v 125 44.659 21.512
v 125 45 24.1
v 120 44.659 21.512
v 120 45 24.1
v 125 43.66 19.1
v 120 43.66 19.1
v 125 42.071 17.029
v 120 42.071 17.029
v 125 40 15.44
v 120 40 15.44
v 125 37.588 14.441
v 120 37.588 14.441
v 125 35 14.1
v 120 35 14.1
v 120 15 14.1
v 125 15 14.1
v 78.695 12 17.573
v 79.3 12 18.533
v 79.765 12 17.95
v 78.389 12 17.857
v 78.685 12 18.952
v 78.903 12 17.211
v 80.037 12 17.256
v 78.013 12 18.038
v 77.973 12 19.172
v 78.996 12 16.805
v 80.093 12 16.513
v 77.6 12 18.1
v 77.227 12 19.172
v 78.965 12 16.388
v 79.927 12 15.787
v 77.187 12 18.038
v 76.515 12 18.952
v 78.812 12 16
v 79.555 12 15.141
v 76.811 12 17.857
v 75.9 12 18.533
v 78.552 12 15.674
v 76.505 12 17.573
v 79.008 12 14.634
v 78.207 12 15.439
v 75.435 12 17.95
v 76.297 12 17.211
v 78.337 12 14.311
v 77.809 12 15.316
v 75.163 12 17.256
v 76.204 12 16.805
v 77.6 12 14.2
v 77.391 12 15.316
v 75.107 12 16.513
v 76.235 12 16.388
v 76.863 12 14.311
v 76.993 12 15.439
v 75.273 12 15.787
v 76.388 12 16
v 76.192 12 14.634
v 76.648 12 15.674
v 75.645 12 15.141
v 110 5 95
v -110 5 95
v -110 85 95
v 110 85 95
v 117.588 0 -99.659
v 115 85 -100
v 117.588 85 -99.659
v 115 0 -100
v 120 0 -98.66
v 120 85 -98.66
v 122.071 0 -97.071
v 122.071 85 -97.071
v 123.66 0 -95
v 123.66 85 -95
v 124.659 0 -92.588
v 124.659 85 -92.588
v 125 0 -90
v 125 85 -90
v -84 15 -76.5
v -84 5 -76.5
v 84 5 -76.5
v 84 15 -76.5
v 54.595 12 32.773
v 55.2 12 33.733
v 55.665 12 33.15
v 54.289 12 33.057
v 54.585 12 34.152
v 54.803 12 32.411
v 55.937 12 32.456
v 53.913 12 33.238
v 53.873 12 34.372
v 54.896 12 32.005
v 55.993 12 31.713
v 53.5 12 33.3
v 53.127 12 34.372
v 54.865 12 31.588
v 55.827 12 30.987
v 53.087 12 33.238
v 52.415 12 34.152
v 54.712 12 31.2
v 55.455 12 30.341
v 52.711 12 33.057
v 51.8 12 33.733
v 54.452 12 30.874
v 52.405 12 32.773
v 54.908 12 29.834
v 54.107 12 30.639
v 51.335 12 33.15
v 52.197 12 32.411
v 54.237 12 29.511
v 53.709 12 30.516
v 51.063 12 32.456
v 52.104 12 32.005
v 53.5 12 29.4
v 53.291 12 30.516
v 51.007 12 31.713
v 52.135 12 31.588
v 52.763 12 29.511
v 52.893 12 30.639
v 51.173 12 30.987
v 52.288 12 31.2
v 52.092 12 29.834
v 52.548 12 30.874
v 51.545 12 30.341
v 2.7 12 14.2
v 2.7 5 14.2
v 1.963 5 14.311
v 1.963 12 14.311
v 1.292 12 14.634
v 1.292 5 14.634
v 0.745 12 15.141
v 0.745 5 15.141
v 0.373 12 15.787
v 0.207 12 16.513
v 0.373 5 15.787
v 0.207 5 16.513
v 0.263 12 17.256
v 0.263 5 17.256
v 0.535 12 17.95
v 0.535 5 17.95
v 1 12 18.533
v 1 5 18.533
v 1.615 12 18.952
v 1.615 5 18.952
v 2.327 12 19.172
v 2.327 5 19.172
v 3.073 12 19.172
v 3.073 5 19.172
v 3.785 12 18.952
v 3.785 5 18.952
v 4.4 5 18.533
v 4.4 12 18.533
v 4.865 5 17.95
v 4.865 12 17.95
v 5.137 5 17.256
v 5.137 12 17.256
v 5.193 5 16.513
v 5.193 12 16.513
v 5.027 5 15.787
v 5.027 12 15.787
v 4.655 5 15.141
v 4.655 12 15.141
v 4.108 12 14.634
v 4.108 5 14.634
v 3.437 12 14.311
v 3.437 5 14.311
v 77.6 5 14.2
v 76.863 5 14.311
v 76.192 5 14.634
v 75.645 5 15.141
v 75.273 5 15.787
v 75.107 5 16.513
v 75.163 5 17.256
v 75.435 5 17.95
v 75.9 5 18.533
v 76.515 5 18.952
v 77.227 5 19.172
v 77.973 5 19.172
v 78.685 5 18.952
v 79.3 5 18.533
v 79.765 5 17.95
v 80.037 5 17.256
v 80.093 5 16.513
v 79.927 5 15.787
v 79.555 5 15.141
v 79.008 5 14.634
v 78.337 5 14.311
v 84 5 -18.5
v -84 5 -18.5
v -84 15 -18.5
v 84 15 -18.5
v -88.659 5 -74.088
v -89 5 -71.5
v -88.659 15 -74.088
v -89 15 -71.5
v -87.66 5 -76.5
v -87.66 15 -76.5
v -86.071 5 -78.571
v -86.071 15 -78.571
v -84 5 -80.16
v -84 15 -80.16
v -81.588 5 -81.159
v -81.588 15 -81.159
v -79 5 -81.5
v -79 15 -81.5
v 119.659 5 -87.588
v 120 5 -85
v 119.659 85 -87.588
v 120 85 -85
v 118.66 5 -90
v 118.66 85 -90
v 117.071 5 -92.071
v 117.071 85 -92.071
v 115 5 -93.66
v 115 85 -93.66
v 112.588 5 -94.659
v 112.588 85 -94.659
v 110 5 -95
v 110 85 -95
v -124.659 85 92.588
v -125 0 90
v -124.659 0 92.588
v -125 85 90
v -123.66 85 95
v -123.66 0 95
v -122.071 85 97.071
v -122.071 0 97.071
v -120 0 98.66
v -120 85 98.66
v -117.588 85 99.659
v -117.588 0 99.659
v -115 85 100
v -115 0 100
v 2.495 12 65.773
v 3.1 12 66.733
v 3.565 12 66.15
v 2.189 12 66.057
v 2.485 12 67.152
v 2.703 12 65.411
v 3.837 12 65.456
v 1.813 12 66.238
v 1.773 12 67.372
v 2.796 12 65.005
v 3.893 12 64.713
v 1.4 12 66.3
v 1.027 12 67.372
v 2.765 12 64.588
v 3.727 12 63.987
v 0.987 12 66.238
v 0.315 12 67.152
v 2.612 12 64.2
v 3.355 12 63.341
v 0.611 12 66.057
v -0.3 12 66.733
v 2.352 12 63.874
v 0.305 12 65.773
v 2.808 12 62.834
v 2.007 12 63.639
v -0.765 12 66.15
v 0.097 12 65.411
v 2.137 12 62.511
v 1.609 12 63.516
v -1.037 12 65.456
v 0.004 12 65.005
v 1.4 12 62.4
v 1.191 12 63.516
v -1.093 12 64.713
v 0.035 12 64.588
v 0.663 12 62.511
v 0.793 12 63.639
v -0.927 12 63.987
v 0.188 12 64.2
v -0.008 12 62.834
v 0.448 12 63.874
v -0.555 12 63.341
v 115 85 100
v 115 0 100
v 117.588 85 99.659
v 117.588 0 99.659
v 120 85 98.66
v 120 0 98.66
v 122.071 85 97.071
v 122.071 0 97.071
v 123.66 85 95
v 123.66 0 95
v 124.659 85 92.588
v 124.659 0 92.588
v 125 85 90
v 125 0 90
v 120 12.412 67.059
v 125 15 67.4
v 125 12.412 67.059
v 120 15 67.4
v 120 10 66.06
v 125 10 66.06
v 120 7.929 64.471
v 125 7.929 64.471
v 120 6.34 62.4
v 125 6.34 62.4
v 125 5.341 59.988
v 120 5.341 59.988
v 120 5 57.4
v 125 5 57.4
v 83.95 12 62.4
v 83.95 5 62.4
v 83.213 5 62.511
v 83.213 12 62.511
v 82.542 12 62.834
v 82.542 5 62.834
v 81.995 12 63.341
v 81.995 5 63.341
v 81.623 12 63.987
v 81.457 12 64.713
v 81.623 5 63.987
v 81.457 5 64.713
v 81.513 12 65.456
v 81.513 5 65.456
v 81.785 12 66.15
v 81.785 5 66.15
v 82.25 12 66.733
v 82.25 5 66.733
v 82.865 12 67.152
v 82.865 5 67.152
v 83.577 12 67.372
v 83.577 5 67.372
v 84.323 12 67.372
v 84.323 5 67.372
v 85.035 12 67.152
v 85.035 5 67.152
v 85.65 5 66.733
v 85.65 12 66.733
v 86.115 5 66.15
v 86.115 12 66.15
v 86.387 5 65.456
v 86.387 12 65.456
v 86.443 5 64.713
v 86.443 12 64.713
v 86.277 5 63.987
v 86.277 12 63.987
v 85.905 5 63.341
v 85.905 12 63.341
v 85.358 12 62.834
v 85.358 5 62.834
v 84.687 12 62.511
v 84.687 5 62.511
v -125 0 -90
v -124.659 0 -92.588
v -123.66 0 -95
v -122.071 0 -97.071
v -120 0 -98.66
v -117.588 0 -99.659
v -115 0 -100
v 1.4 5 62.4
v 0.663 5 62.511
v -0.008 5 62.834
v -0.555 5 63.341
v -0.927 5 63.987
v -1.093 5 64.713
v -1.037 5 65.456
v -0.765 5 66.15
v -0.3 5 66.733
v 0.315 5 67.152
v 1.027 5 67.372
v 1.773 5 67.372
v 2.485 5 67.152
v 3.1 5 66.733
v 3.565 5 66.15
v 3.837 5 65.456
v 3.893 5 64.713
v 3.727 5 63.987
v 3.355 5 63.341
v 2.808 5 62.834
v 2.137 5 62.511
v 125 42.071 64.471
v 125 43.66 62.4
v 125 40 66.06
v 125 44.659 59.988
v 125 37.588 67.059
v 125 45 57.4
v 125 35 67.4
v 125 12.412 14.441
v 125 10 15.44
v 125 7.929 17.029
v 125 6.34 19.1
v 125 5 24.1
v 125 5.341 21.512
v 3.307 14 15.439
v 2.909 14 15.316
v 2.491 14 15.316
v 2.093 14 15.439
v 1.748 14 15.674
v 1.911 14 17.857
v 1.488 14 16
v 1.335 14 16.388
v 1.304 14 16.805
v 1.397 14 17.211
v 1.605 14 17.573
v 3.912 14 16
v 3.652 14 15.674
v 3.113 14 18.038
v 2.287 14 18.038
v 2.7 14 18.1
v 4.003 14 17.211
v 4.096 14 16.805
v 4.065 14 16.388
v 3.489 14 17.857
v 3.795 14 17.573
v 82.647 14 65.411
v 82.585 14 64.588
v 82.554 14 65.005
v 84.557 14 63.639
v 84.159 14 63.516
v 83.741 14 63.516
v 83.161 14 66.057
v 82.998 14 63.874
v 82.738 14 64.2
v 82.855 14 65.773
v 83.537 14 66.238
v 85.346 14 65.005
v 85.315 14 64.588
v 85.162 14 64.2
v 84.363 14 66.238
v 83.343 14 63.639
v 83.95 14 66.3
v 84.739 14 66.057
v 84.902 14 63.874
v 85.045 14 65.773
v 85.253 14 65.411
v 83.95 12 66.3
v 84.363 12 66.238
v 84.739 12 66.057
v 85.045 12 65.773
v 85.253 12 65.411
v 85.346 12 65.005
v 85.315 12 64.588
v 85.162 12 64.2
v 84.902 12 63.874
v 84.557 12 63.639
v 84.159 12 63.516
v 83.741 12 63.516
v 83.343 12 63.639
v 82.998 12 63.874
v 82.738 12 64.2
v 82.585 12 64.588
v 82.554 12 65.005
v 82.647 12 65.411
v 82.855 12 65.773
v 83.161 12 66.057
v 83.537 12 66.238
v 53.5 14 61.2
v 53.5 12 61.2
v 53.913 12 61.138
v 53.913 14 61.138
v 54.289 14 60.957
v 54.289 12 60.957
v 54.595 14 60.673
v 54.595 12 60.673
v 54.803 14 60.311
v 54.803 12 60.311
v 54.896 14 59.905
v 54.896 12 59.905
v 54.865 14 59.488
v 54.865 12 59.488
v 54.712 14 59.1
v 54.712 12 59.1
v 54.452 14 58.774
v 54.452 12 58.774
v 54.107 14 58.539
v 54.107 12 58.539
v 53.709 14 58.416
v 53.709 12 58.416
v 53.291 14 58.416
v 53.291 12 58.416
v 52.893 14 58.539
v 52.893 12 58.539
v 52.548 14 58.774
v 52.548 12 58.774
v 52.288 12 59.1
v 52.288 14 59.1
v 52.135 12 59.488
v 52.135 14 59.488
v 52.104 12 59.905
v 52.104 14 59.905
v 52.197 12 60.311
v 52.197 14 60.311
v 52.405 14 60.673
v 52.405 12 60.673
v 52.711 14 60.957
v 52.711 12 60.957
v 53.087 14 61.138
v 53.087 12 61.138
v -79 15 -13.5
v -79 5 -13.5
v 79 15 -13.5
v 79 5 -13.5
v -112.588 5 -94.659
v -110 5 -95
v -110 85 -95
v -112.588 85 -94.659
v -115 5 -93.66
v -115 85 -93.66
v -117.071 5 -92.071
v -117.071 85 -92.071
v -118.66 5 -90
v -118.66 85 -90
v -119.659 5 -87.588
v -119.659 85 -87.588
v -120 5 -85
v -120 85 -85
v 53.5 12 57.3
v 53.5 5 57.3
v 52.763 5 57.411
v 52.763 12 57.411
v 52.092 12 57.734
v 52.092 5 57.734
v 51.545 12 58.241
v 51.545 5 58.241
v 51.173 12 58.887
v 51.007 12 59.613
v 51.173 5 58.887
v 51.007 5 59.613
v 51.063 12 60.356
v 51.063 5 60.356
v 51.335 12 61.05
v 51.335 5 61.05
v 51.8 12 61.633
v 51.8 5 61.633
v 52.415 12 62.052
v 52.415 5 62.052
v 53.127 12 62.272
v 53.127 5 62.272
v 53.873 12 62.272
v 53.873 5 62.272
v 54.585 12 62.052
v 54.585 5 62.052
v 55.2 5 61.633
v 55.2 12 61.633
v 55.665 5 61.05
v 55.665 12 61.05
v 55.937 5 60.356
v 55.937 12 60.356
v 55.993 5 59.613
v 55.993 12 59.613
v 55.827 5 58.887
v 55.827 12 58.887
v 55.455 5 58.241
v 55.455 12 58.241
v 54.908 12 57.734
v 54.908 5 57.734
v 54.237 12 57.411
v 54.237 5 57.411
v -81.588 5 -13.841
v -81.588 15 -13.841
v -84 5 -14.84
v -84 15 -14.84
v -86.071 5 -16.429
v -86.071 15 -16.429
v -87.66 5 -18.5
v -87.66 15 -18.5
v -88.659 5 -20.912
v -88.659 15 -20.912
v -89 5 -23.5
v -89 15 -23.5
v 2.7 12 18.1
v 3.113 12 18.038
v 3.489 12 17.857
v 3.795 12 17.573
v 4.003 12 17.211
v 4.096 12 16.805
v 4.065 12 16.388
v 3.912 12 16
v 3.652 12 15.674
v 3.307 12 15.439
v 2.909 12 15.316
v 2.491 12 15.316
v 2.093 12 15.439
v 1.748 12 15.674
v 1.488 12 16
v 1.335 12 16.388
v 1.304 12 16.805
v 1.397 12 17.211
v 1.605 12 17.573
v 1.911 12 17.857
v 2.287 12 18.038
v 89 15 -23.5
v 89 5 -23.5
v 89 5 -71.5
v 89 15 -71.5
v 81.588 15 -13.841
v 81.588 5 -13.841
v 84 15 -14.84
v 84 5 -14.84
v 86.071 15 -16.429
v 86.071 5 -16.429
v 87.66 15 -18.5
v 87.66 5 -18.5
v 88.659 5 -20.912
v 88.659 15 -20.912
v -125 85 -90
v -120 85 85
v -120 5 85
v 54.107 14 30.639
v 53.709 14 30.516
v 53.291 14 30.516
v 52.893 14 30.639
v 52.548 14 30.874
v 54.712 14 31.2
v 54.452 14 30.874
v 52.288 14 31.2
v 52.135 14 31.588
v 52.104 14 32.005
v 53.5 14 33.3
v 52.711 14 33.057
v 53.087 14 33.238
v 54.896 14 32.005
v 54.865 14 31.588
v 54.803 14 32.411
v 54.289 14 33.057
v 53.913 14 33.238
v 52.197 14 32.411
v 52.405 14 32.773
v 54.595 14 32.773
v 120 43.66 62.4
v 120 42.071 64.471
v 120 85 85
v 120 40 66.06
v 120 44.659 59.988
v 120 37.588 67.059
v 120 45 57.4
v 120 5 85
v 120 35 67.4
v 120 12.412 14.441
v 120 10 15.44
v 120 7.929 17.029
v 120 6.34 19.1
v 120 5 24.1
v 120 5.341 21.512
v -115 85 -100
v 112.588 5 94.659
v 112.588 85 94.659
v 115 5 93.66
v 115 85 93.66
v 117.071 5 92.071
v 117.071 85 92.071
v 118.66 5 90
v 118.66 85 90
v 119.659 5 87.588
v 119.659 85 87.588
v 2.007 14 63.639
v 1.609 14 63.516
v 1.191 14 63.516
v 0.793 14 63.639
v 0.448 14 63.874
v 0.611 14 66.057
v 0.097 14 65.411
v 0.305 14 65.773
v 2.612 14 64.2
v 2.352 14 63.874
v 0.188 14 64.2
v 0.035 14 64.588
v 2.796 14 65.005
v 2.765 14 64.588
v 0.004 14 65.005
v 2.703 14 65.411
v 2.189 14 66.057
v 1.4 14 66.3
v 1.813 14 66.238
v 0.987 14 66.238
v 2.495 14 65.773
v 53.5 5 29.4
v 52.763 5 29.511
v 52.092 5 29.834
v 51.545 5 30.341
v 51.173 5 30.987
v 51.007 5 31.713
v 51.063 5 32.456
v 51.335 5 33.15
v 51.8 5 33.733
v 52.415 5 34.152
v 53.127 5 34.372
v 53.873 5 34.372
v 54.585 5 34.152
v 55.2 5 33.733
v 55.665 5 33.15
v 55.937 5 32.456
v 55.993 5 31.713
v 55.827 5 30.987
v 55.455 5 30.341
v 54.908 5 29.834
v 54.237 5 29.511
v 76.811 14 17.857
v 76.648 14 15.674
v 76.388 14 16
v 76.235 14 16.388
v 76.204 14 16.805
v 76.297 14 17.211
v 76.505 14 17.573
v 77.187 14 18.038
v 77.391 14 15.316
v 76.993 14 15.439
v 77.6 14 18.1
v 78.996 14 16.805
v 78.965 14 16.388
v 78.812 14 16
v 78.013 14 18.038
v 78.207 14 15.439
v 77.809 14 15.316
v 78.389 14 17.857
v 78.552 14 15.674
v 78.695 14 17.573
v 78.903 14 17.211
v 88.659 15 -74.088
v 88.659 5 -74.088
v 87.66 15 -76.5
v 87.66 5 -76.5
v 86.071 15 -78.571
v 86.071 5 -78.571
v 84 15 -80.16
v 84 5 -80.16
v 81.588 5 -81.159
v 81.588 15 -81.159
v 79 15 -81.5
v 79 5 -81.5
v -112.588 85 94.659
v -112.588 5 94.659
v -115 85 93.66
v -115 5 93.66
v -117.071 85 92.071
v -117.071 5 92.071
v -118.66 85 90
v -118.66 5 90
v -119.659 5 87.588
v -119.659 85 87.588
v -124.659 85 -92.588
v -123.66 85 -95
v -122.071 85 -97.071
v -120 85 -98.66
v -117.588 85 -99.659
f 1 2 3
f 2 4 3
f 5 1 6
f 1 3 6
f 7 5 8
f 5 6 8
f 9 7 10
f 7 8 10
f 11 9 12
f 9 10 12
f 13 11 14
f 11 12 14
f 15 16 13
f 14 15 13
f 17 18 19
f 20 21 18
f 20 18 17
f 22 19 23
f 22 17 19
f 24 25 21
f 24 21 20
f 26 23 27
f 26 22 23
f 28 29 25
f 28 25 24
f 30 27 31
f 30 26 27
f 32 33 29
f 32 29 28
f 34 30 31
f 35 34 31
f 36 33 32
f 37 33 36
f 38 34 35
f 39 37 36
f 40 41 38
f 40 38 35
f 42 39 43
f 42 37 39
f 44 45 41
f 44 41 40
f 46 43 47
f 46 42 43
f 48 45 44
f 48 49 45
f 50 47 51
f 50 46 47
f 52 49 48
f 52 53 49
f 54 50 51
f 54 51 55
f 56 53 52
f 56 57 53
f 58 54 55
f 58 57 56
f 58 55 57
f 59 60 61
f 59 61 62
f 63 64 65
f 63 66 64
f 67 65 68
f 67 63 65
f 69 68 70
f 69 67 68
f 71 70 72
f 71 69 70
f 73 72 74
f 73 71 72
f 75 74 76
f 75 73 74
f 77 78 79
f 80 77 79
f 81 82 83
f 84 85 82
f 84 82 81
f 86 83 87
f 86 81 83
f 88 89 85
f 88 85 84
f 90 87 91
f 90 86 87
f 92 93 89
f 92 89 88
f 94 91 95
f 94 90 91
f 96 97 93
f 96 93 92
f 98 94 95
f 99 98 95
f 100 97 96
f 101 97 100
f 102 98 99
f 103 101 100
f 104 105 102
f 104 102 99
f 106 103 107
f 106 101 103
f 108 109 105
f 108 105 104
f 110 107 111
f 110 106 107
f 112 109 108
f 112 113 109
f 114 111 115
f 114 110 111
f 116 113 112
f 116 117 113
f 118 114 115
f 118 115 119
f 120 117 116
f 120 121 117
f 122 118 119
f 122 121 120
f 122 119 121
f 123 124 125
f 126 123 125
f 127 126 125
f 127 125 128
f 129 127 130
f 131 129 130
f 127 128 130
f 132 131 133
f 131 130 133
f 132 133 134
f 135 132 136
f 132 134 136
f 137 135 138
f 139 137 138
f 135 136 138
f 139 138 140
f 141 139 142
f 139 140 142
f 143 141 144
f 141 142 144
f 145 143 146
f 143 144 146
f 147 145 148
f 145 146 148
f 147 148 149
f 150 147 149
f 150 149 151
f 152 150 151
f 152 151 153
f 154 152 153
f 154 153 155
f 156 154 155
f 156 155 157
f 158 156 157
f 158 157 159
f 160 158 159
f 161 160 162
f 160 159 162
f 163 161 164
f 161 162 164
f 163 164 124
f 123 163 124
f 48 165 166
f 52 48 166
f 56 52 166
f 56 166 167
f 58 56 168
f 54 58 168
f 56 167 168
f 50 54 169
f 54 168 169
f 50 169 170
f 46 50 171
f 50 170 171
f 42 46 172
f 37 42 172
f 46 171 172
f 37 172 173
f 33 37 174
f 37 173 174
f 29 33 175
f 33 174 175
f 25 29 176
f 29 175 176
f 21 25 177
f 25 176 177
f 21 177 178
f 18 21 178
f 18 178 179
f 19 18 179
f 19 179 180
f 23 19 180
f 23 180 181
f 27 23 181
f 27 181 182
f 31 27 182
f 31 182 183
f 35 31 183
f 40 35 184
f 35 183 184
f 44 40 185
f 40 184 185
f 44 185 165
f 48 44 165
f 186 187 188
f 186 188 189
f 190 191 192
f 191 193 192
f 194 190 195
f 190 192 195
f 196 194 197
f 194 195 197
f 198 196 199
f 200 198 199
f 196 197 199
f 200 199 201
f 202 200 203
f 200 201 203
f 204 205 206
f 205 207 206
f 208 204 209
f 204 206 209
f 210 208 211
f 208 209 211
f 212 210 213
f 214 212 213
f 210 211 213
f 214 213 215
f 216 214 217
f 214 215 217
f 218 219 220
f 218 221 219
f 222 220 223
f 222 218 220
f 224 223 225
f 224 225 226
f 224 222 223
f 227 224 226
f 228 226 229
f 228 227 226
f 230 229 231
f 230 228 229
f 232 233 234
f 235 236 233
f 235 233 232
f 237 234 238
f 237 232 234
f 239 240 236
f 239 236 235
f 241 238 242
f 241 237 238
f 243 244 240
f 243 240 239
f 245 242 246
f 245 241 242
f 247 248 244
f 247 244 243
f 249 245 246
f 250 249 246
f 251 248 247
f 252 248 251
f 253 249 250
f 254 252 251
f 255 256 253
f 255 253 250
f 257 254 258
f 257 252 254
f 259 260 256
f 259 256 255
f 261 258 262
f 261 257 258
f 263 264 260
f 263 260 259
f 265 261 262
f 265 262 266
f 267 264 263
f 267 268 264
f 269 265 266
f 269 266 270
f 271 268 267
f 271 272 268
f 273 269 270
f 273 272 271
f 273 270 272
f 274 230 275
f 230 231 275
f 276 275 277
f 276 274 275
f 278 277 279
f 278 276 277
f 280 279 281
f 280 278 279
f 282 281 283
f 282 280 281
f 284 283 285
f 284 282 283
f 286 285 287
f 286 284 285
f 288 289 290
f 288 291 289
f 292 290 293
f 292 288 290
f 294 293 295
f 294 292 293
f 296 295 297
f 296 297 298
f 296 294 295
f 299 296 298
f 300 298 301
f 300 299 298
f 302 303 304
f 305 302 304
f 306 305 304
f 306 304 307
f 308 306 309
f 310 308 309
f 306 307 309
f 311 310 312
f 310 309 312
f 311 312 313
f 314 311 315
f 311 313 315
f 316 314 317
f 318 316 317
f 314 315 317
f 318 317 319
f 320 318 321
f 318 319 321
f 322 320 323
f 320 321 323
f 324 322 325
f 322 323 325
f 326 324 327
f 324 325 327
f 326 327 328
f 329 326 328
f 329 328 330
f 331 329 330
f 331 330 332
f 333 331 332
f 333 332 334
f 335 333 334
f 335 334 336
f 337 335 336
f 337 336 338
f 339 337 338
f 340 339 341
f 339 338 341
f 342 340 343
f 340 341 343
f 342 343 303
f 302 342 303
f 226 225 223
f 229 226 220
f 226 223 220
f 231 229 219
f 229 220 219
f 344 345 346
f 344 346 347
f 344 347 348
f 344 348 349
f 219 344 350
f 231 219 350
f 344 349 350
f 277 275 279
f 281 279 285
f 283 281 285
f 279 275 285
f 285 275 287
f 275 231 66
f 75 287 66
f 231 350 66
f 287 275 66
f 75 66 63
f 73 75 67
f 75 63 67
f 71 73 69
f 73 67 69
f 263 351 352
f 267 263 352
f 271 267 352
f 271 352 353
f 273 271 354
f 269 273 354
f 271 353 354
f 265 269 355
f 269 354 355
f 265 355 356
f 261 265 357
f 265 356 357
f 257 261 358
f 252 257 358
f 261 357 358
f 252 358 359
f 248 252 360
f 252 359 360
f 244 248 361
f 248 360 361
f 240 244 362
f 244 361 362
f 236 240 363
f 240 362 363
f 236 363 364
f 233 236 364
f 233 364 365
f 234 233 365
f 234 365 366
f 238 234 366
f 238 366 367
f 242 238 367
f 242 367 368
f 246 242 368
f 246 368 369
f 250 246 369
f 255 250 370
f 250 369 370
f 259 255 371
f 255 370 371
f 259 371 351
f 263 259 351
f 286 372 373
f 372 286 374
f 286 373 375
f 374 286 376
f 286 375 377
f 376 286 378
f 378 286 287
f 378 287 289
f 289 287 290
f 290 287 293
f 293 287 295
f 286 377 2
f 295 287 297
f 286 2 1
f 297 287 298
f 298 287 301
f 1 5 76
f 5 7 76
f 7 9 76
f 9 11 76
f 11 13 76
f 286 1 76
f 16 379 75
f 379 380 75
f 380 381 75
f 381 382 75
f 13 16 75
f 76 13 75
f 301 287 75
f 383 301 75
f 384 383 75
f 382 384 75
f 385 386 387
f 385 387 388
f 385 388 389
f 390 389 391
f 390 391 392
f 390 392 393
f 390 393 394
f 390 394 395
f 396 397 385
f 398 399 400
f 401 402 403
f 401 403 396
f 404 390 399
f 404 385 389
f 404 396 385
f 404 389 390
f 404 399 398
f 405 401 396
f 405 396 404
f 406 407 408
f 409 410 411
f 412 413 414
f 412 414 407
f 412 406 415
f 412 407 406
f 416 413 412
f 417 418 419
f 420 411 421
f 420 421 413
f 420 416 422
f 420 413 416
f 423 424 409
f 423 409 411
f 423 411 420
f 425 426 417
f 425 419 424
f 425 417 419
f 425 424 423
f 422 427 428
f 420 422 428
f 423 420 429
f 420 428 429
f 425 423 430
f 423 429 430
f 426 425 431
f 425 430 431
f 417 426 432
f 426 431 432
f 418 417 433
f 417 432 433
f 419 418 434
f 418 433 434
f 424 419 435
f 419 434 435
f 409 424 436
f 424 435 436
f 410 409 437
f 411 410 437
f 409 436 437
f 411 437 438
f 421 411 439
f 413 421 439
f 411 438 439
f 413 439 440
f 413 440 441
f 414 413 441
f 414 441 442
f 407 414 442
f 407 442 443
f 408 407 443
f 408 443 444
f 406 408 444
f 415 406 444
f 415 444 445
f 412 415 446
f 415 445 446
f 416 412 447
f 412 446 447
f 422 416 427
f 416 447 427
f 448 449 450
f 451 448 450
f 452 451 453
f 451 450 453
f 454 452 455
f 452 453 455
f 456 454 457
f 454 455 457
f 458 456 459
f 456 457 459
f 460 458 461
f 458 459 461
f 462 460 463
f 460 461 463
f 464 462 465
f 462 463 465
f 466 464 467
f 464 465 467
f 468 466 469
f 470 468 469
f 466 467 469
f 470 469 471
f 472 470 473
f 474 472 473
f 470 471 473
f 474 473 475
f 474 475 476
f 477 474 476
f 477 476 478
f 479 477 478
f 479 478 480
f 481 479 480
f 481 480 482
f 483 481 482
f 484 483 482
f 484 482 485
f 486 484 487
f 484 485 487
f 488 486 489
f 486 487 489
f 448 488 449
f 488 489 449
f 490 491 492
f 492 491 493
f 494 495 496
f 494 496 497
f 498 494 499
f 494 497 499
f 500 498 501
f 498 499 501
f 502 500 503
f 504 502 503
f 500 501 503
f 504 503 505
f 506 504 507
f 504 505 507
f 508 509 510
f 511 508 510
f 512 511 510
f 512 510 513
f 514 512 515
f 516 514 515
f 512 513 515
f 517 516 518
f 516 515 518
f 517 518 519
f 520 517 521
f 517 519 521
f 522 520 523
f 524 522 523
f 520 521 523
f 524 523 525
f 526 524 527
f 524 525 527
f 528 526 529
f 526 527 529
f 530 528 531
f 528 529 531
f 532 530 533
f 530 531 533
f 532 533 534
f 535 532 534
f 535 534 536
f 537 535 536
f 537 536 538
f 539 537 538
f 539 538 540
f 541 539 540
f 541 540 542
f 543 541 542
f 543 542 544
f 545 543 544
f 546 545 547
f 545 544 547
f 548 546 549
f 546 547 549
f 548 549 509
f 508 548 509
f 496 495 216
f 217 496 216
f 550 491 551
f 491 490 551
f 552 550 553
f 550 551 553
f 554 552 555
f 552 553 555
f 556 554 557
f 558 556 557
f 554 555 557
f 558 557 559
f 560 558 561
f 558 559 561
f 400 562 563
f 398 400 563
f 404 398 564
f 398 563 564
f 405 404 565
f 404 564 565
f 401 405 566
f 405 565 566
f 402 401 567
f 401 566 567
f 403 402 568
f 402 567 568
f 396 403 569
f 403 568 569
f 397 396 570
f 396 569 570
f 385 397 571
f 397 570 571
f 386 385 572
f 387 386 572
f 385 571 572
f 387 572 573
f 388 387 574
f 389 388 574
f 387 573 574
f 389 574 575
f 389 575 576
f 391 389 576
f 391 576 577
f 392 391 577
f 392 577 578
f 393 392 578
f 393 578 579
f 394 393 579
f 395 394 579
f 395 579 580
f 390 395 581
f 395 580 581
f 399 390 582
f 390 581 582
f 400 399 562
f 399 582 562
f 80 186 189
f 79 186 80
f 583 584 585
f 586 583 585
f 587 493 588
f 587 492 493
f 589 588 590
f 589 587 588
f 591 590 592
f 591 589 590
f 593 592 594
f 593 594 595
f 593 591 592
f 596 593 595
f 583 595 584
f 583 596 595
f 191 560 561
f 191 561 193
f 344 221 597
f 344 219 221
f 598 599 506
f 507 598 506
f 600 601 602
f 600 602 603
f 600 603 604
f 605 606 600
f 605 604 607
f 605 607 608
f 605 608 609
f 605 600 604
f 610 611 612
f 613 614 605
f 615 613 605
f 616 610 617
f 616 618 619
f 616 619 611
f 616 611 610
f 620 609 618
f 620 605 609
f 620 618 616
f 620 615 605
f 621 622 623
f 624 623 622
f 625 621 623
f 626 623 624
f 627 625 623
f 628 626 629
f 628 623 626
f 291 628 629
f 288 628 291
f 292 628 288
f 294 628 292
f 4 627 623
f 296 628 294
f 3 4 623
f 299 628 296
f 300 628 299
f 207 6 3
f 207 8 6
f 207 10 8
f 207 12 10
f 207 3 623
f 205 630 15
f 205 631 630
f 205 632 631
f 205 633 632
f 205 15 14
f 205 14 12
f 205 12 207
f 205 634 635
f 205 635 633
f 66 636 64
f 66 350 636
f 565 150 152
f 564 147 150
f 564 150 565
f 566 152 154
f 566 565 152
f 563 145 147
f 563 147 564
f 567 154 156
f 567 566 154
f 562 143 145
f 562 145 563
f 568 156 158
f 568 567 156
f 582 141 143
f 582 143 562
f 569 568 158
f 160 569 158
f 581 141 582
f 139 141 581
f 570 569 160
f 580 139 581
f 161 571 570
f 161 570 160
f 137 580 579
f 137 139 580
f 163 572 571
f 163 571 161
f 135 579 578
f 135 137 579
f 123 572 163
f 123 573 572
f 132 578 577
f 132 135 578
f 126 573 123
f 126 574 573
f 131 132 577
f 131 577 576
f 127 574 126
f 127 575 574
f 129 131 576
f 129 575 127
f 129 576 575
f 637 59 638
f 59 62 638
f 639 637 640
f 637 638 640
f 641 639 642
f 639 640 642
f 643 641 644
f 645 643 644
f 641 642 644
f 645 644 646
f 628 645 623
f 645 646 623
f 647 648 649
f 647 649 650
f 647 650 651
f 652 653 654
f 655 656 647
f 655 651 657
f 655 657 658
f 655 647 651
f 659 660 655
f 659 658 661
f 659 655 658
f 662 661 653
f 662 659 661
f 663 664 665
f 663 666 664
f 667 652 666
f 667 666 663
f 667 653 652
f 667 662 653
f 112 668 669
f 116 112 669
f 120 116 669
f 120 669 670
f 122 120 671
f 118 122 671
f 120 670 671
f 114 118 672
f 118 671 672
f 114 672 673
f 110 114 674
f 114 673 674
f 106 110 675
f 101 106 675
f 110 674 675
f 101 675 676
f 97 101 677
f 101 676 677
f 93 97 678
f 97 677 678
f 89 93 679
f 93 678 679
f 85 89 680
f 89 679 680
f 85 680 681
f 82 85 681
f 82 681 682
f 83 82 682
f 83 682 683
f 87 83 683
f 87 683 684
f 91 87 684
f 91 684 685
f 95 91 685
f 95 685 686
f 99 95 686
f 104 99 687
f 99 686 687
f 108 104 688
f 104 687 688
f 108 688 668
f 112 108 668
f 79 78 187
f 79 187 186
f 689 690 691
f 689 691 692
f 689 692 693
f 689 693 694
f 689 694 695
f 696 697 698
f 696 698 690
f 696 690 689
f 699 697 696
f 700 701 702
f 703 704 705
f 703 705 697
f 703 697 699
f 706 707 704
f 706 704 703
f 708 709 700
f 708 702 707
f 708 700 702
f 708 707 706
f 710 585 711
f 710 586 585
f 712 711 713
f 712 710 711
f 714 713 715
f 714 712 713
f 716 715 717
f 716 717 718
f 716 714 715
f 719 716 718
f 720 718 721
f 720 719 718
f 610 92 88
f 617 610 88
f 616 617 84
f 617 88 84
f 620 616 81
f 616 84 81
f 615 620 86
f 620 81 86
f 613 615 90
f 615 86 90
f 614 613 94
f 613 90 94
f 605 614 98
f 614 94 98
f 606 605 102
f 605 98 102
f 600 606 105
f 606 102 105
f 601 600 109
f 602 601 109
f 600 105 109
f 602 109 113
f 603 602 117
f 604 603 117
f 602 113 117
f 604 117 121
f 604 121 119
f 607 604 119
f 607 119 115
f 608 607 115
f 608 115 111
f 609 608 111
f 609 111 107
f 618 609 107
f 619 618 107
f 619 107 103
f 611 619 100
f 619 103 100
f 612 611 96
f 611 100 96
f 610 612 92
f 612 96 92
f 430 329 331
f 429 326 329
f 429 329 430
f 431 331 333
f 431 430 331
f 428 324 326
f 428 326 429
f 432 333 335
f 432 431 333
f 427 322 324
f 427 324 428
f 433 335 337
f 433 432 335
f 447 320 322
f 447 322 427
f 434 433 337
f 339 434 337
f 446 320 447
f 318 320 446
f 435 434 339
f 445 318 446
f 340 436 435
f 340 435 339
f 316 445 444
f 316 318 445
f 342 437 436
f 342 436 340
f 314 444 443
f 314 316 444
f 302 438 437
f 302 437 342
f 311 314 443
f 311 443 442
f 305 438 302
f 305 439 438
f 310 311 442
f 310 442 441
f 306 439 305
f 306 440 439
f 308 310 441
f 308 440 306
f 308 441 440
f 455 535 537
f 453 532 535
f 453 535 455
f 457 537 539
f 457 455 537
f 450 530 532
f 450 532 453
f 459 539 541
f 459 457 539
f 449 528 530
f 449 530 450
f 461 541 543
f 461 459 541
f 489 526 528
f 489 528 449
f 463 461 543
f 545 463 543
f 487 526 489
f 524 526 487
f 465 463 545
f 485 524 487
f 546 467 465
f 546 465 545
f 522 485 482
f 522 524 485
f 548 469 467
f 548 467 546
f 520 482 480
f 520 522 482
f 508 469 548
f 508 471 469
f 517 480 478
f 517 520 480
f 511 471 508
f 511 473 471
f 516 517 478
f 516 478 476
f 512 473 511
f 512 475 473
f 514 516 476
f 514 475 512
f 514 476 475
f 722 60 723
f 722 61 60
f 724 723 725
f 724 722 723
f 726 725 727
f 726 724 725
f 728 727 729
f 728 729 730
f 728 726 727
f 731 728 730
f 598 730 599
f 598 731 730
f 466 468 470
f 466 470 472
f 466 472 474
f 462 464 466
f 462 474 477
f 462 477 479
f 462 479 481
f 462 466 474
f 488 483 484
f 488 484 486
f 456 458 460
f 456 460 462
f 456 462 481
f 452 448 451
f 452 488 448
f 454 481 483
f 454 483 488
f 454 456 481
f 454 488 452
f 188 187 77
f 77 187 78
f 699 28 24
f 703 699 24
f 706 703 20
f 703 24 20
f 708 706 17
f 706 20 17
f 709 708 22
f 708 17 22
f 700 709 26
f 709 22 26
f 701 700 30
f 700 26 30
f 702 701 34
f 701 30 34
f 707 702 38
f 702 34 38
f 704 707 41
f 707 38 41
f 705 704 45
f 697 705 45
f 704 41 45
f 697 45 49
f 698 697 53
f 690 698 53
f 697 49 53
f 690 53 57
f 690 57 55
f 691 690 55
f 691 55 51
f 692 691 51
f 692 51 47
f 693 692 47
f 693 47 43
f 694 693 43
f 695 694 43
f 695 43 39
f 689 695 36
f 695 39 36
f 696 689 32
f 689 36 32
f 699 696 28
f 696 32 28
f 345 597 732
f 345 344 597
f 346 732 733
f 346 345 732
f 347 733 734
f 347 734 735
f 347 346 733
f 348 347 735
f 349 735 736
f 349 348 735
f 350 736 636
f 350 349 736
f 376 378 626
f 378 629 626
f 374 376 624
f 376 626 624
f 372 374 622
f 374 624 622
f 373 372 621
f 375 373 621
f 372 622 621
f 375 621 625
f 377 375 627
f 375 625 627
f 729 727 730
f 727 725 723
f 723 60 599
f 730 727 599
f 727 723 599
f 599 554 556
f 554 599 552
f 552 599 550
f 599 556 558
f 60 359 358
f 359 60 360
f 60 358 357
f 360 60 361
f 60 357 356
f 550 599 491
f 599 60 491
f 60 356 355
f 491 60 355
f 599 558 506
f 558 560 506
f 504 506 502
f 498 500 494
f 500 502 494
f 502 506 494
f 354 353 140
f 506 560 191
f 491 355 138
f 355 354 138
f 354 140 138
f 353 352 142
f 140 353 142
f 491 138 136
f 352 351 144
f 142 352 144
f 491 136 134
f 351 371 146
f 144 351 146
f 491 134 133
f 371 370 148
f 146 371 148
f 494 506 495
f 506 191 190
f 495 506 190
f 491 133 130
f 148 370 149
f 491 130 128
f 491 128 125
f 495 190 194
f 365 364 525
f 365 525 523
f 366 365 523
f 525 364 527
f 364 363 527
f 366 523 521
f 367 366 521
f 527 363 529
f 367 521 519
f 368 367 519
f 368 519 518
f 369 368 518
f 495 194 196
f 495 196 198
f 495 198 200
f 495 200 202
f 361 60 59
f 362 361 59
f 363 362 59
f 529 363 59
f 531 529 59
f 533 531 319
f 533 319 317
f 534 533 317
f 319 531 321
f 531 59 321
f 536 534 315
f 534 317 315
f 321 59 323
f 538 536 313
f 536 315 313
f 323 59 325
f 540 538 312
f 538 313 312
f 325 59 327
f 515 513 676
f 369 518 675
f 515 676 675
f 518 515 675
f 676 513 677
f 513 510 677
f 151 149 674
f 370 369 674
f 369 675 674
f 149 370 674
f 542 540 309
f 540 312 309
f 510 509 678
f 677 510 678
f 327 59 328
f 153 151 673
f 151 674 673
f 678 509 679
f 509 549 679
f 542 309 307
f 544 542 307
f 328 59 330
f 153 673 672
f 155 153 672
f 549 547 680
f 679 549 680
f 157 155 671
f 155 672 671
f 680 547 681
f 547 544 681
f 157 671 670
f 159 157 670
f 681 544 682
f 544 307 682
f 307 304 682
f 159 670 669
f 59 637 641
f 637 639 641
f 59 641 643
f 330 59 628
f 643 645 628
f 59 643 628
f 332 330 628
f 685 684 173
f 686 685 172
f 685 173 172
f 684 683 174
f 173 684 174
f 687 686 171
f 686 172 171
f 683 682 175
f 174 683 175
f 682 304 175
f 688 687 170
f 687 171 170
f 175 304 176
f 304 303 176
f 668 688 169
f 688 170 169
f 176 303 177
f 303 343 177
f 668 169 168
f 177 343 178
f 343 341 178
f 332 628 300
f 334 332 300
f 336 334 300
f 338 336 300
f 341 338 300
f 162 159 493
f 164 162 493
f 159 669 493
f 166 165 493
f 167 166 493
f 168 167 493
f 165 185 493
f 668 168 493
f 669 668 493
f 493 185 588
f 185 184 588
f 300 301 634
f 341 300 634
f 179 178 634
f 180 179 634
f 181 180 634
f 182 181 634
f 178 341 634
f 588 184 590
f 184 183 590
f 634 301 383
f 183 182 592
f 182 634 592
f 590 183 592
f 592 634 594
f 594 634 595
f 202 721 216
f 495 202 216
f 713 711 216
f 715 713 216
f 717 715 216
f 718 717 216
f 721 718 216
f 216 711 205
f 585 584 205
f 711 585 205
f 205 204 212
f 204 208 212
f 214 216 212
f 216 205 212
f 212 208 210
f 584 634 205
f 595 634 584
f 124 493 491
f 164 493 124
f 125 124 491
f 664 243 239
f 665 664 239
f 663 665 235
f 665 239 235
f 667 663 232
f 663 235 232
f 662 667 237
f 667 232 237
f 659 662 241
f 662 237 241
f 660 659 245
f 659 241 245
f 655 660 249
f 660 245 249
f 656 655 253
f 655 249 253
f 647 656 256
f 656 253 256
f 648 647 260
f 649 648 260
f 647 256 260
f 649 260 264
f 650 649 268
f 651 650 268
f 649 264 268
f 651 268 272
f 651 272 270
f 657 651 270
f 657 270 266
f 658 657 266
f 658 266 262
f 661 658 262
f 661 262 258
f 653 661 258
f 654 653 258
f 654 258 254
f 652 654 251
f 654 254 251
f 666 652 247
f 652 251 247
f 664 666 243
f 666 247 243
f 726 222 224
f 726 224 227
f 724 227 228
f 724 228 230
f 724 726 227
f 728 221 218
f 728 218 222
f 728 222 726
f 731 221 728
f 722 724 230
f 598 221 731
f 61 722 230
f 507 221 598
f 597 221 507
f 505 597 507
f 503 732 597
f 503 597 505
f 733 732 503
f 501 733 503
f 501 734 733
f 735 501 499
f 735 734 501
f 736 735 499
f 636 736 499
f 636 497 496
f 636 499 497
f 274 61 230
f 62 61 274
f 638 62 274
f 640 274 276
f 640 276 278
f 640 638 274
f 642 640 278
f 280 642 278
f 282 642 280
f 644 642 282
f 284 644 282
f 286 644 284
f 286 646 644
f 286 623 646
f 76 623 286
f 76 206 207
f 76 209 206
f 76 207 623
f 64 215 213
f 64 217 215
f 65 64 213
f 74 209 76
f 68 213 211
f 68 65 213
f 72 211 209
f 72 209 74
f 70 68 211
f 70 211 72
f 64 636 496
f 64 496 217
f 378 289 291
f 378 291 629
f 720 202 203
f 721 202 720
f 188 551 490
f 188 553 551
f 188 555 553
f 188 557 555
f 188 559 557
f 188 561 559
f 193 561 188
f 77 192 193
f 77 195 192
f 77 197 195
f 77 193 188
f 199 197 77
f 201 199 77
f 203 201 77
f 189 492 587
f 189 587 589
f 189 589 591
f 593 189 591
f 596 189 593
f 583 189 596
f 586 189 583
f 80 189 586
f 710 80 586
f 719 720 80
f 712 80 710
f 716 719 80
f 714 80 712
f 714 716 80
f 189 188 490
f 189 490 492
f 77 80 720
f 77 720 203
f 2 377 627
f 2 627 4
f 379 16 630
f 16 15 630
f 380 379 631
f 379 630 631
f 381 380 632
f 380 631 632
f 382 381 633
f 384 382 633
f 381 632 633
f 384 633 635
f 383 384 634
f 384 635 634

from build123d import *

# Parameters (mm, degrees)
SKETCH2_W           = 250
SKETCH2_H           = 200
BOSS_EXTRUDE1_DEPTH = 5
SKETCH3_W           = 250
SKETCH3_H           = 200
SKETCH3_W_2         = 240
SKETCH3_H_2         = 190
BOSS_EXTRUDE2_DEPTH = 80
SKETCH1_W           = 178
SKETCH1_H           = 68
SKETCH1_W_2         = 168
SKETCH1_H_2         = 58
BOSS_EXTRUDE3_DEPTH = 10
SKETCH7_R           = 2.5
BOSS_EXTRUDE4_DEPTH = 7
SKETCH8_R           = 1.4
BOSS_EXTRUDE5_DEPTH = 2
CUT_EXTRUDE1_REACH  = 284.356
SKETCH4_W           = 53.3
SKETCH4_H           = 40
FILLET1_R           = 10


with BuildPart() as part:
    # Sketch2 → Boss-Extrude1 (new body)
    with BuildSketch(Plane(origin=(0, 0, 0), x_dir=(1, 0, 0), z_dir=(0, 1, 0))):
        Rectangle(SKETCH2_W, SKETCH2_H)
    extrude(amount=BOSS_EXTRUDE1_DEPTH)

    # Sketch3 → Boss-Extrude2 (add)
    with BuildSketch(Plane(origin=(0, 5, 0), x_dir=(1, 0, 0), z_dir=(0, 1, 0))):
        Rectangle(SKETCH3_W, SKETCH3_H)
        Rectangle(SKETCH3_W_2, SKETCH3_H_2, mode=Mode.SUBTRACT)
    extrude(amount=BOSS_EXTRUDE2_DEPTH)

    # Sketch1 → Boss-Extrude3 (add)
    with BuildSketch(Plane(origin=(0, 5, 0), x_dir=(1, 0, 0), z_dir=(0, 1, 0))):
        with Locations((0, 47.5)):
            Rectangle(SKETCH1_W, SKETCH1_H)
        with Locations((0, 47.5)):
            Rectangle(SKETCH1_W_2, SKETCH1_H_2, mode=Mode.SUBTRACT)
    extrude(amount=BOSS_EXTRUDE3_DEPTH)

    # Sketch7 → Boss-Extrude4 (add)
    with BuildSketch(Plane(origin=(0, 5, 0), x_dir=(1, 0, 0), z_dir=(0, 1, 0))):
        with Locations(Location((2.7, -16.7, 0), (0, 0, 90))):
            Circle(SKETCH7_R)
        with Locations(Location((1.4, -64.9, 0), (0, 0, 90))):
            Circle(SKETCH7_R)
        with Locations(Location((53.5, -31.9, 0), (0, 0, 90))):
            Circle(SKETCH7_R)
        with Locations(Location((77.6, -16.7, 0), (0, 0, 90))):
            Circle(SKETCH7_R)
        with Locations(Location((83.95, -64.9, 0), (0, 0, 90))):
            Circle(SKETCH7_R)
        with Locations(Location((53.5, -59.8, 0), (0, 0, 90))):
            Circle(SKETCH7_R)
    extrude(amount=BOSS_EXTRUDE4_DEPTH)

    # Sketch8 → Boss-Extrude5 (add)
    with BuildSketch(Plane(origin=(0, 12, 0), x_dir=(1, 0, 0), z_dir=(0, 1, 0))):
        with Locations(Location((2.7, -16.7, 0), (0, 0, 270))):
            Circle(SKETCH8_R)
        with Locations(Location((53.5, -31.9, 0), (0, 0, 270))):
            Circle(SKETCH8_R)
        with Locations(Location((77.6, -16.7, 0), (0, 0, 270))):
            Circle(SKETCH8_R)
        with Locations(Location((53.5, -59.8, 0), (0, 0, 270))):
            Circle(SKETCH8_R)
        with Locations(Location((1.4, -64.9, 0), (0, 0, 270))):
            Circle(SKETCH8_R)
        with Locations(Location((83.95, -64.9, 0), (0, 0, 270))):
            Circle(SKETCH8_R)
    extrude(amount=BOSS_EXTRUDE5_DEPTH)

    # Sketch4 → Cut-Extrude1 (cut, up to next)
    with BuildSketch(Plane(origin=(125, 0, 0), x_dir=(0, 0, -1), z_dir=(1, 0, 0)), mode=Mode.PRIVATE) as cut_extrude1_sk1:
        with Locations((-40.75, 25)):
            Rectangle(SKETCH4_W, SKETCH4_H)
    cut_extrude1_tool1 = extrude(cut_extrude1_sk1.sketch, amount=-CUT_EXTRUDE1_REACH, mode=Mode.PRIVATE) & part.part
    add(cut_extrude1_tool1.solids().sort_by_distance((125, 25, 40.75))[0], mode=Mode.SUBTRACT)

    # Fillet1
    fillet1_edges = [part.edges().sort_by_distance(p)[0] for p in [
        (122.5, 5, 67.4),
        (122.5, 45, 67.4),
        (122.5, 45, 14.1),
        (122.5, 5, 14.1),
        (120, 45, 95),
        (120, 45, -95),
        (-120, 45, -95),
        (-120, 45, 95),
        (-89, 10, -13.5),
        (89, 10, -13.5),
        (89, 10, -81.5),
        (-89, 10, -81.5),
        (125, 42.5, 100),
        (-125, 42.5, 100),
        (-125, 42.5, -100),
        (125, 42.5, -100),
    ]]
    fillet(fillet1_edges, radius=FILLET1_R)


solid = part.part
